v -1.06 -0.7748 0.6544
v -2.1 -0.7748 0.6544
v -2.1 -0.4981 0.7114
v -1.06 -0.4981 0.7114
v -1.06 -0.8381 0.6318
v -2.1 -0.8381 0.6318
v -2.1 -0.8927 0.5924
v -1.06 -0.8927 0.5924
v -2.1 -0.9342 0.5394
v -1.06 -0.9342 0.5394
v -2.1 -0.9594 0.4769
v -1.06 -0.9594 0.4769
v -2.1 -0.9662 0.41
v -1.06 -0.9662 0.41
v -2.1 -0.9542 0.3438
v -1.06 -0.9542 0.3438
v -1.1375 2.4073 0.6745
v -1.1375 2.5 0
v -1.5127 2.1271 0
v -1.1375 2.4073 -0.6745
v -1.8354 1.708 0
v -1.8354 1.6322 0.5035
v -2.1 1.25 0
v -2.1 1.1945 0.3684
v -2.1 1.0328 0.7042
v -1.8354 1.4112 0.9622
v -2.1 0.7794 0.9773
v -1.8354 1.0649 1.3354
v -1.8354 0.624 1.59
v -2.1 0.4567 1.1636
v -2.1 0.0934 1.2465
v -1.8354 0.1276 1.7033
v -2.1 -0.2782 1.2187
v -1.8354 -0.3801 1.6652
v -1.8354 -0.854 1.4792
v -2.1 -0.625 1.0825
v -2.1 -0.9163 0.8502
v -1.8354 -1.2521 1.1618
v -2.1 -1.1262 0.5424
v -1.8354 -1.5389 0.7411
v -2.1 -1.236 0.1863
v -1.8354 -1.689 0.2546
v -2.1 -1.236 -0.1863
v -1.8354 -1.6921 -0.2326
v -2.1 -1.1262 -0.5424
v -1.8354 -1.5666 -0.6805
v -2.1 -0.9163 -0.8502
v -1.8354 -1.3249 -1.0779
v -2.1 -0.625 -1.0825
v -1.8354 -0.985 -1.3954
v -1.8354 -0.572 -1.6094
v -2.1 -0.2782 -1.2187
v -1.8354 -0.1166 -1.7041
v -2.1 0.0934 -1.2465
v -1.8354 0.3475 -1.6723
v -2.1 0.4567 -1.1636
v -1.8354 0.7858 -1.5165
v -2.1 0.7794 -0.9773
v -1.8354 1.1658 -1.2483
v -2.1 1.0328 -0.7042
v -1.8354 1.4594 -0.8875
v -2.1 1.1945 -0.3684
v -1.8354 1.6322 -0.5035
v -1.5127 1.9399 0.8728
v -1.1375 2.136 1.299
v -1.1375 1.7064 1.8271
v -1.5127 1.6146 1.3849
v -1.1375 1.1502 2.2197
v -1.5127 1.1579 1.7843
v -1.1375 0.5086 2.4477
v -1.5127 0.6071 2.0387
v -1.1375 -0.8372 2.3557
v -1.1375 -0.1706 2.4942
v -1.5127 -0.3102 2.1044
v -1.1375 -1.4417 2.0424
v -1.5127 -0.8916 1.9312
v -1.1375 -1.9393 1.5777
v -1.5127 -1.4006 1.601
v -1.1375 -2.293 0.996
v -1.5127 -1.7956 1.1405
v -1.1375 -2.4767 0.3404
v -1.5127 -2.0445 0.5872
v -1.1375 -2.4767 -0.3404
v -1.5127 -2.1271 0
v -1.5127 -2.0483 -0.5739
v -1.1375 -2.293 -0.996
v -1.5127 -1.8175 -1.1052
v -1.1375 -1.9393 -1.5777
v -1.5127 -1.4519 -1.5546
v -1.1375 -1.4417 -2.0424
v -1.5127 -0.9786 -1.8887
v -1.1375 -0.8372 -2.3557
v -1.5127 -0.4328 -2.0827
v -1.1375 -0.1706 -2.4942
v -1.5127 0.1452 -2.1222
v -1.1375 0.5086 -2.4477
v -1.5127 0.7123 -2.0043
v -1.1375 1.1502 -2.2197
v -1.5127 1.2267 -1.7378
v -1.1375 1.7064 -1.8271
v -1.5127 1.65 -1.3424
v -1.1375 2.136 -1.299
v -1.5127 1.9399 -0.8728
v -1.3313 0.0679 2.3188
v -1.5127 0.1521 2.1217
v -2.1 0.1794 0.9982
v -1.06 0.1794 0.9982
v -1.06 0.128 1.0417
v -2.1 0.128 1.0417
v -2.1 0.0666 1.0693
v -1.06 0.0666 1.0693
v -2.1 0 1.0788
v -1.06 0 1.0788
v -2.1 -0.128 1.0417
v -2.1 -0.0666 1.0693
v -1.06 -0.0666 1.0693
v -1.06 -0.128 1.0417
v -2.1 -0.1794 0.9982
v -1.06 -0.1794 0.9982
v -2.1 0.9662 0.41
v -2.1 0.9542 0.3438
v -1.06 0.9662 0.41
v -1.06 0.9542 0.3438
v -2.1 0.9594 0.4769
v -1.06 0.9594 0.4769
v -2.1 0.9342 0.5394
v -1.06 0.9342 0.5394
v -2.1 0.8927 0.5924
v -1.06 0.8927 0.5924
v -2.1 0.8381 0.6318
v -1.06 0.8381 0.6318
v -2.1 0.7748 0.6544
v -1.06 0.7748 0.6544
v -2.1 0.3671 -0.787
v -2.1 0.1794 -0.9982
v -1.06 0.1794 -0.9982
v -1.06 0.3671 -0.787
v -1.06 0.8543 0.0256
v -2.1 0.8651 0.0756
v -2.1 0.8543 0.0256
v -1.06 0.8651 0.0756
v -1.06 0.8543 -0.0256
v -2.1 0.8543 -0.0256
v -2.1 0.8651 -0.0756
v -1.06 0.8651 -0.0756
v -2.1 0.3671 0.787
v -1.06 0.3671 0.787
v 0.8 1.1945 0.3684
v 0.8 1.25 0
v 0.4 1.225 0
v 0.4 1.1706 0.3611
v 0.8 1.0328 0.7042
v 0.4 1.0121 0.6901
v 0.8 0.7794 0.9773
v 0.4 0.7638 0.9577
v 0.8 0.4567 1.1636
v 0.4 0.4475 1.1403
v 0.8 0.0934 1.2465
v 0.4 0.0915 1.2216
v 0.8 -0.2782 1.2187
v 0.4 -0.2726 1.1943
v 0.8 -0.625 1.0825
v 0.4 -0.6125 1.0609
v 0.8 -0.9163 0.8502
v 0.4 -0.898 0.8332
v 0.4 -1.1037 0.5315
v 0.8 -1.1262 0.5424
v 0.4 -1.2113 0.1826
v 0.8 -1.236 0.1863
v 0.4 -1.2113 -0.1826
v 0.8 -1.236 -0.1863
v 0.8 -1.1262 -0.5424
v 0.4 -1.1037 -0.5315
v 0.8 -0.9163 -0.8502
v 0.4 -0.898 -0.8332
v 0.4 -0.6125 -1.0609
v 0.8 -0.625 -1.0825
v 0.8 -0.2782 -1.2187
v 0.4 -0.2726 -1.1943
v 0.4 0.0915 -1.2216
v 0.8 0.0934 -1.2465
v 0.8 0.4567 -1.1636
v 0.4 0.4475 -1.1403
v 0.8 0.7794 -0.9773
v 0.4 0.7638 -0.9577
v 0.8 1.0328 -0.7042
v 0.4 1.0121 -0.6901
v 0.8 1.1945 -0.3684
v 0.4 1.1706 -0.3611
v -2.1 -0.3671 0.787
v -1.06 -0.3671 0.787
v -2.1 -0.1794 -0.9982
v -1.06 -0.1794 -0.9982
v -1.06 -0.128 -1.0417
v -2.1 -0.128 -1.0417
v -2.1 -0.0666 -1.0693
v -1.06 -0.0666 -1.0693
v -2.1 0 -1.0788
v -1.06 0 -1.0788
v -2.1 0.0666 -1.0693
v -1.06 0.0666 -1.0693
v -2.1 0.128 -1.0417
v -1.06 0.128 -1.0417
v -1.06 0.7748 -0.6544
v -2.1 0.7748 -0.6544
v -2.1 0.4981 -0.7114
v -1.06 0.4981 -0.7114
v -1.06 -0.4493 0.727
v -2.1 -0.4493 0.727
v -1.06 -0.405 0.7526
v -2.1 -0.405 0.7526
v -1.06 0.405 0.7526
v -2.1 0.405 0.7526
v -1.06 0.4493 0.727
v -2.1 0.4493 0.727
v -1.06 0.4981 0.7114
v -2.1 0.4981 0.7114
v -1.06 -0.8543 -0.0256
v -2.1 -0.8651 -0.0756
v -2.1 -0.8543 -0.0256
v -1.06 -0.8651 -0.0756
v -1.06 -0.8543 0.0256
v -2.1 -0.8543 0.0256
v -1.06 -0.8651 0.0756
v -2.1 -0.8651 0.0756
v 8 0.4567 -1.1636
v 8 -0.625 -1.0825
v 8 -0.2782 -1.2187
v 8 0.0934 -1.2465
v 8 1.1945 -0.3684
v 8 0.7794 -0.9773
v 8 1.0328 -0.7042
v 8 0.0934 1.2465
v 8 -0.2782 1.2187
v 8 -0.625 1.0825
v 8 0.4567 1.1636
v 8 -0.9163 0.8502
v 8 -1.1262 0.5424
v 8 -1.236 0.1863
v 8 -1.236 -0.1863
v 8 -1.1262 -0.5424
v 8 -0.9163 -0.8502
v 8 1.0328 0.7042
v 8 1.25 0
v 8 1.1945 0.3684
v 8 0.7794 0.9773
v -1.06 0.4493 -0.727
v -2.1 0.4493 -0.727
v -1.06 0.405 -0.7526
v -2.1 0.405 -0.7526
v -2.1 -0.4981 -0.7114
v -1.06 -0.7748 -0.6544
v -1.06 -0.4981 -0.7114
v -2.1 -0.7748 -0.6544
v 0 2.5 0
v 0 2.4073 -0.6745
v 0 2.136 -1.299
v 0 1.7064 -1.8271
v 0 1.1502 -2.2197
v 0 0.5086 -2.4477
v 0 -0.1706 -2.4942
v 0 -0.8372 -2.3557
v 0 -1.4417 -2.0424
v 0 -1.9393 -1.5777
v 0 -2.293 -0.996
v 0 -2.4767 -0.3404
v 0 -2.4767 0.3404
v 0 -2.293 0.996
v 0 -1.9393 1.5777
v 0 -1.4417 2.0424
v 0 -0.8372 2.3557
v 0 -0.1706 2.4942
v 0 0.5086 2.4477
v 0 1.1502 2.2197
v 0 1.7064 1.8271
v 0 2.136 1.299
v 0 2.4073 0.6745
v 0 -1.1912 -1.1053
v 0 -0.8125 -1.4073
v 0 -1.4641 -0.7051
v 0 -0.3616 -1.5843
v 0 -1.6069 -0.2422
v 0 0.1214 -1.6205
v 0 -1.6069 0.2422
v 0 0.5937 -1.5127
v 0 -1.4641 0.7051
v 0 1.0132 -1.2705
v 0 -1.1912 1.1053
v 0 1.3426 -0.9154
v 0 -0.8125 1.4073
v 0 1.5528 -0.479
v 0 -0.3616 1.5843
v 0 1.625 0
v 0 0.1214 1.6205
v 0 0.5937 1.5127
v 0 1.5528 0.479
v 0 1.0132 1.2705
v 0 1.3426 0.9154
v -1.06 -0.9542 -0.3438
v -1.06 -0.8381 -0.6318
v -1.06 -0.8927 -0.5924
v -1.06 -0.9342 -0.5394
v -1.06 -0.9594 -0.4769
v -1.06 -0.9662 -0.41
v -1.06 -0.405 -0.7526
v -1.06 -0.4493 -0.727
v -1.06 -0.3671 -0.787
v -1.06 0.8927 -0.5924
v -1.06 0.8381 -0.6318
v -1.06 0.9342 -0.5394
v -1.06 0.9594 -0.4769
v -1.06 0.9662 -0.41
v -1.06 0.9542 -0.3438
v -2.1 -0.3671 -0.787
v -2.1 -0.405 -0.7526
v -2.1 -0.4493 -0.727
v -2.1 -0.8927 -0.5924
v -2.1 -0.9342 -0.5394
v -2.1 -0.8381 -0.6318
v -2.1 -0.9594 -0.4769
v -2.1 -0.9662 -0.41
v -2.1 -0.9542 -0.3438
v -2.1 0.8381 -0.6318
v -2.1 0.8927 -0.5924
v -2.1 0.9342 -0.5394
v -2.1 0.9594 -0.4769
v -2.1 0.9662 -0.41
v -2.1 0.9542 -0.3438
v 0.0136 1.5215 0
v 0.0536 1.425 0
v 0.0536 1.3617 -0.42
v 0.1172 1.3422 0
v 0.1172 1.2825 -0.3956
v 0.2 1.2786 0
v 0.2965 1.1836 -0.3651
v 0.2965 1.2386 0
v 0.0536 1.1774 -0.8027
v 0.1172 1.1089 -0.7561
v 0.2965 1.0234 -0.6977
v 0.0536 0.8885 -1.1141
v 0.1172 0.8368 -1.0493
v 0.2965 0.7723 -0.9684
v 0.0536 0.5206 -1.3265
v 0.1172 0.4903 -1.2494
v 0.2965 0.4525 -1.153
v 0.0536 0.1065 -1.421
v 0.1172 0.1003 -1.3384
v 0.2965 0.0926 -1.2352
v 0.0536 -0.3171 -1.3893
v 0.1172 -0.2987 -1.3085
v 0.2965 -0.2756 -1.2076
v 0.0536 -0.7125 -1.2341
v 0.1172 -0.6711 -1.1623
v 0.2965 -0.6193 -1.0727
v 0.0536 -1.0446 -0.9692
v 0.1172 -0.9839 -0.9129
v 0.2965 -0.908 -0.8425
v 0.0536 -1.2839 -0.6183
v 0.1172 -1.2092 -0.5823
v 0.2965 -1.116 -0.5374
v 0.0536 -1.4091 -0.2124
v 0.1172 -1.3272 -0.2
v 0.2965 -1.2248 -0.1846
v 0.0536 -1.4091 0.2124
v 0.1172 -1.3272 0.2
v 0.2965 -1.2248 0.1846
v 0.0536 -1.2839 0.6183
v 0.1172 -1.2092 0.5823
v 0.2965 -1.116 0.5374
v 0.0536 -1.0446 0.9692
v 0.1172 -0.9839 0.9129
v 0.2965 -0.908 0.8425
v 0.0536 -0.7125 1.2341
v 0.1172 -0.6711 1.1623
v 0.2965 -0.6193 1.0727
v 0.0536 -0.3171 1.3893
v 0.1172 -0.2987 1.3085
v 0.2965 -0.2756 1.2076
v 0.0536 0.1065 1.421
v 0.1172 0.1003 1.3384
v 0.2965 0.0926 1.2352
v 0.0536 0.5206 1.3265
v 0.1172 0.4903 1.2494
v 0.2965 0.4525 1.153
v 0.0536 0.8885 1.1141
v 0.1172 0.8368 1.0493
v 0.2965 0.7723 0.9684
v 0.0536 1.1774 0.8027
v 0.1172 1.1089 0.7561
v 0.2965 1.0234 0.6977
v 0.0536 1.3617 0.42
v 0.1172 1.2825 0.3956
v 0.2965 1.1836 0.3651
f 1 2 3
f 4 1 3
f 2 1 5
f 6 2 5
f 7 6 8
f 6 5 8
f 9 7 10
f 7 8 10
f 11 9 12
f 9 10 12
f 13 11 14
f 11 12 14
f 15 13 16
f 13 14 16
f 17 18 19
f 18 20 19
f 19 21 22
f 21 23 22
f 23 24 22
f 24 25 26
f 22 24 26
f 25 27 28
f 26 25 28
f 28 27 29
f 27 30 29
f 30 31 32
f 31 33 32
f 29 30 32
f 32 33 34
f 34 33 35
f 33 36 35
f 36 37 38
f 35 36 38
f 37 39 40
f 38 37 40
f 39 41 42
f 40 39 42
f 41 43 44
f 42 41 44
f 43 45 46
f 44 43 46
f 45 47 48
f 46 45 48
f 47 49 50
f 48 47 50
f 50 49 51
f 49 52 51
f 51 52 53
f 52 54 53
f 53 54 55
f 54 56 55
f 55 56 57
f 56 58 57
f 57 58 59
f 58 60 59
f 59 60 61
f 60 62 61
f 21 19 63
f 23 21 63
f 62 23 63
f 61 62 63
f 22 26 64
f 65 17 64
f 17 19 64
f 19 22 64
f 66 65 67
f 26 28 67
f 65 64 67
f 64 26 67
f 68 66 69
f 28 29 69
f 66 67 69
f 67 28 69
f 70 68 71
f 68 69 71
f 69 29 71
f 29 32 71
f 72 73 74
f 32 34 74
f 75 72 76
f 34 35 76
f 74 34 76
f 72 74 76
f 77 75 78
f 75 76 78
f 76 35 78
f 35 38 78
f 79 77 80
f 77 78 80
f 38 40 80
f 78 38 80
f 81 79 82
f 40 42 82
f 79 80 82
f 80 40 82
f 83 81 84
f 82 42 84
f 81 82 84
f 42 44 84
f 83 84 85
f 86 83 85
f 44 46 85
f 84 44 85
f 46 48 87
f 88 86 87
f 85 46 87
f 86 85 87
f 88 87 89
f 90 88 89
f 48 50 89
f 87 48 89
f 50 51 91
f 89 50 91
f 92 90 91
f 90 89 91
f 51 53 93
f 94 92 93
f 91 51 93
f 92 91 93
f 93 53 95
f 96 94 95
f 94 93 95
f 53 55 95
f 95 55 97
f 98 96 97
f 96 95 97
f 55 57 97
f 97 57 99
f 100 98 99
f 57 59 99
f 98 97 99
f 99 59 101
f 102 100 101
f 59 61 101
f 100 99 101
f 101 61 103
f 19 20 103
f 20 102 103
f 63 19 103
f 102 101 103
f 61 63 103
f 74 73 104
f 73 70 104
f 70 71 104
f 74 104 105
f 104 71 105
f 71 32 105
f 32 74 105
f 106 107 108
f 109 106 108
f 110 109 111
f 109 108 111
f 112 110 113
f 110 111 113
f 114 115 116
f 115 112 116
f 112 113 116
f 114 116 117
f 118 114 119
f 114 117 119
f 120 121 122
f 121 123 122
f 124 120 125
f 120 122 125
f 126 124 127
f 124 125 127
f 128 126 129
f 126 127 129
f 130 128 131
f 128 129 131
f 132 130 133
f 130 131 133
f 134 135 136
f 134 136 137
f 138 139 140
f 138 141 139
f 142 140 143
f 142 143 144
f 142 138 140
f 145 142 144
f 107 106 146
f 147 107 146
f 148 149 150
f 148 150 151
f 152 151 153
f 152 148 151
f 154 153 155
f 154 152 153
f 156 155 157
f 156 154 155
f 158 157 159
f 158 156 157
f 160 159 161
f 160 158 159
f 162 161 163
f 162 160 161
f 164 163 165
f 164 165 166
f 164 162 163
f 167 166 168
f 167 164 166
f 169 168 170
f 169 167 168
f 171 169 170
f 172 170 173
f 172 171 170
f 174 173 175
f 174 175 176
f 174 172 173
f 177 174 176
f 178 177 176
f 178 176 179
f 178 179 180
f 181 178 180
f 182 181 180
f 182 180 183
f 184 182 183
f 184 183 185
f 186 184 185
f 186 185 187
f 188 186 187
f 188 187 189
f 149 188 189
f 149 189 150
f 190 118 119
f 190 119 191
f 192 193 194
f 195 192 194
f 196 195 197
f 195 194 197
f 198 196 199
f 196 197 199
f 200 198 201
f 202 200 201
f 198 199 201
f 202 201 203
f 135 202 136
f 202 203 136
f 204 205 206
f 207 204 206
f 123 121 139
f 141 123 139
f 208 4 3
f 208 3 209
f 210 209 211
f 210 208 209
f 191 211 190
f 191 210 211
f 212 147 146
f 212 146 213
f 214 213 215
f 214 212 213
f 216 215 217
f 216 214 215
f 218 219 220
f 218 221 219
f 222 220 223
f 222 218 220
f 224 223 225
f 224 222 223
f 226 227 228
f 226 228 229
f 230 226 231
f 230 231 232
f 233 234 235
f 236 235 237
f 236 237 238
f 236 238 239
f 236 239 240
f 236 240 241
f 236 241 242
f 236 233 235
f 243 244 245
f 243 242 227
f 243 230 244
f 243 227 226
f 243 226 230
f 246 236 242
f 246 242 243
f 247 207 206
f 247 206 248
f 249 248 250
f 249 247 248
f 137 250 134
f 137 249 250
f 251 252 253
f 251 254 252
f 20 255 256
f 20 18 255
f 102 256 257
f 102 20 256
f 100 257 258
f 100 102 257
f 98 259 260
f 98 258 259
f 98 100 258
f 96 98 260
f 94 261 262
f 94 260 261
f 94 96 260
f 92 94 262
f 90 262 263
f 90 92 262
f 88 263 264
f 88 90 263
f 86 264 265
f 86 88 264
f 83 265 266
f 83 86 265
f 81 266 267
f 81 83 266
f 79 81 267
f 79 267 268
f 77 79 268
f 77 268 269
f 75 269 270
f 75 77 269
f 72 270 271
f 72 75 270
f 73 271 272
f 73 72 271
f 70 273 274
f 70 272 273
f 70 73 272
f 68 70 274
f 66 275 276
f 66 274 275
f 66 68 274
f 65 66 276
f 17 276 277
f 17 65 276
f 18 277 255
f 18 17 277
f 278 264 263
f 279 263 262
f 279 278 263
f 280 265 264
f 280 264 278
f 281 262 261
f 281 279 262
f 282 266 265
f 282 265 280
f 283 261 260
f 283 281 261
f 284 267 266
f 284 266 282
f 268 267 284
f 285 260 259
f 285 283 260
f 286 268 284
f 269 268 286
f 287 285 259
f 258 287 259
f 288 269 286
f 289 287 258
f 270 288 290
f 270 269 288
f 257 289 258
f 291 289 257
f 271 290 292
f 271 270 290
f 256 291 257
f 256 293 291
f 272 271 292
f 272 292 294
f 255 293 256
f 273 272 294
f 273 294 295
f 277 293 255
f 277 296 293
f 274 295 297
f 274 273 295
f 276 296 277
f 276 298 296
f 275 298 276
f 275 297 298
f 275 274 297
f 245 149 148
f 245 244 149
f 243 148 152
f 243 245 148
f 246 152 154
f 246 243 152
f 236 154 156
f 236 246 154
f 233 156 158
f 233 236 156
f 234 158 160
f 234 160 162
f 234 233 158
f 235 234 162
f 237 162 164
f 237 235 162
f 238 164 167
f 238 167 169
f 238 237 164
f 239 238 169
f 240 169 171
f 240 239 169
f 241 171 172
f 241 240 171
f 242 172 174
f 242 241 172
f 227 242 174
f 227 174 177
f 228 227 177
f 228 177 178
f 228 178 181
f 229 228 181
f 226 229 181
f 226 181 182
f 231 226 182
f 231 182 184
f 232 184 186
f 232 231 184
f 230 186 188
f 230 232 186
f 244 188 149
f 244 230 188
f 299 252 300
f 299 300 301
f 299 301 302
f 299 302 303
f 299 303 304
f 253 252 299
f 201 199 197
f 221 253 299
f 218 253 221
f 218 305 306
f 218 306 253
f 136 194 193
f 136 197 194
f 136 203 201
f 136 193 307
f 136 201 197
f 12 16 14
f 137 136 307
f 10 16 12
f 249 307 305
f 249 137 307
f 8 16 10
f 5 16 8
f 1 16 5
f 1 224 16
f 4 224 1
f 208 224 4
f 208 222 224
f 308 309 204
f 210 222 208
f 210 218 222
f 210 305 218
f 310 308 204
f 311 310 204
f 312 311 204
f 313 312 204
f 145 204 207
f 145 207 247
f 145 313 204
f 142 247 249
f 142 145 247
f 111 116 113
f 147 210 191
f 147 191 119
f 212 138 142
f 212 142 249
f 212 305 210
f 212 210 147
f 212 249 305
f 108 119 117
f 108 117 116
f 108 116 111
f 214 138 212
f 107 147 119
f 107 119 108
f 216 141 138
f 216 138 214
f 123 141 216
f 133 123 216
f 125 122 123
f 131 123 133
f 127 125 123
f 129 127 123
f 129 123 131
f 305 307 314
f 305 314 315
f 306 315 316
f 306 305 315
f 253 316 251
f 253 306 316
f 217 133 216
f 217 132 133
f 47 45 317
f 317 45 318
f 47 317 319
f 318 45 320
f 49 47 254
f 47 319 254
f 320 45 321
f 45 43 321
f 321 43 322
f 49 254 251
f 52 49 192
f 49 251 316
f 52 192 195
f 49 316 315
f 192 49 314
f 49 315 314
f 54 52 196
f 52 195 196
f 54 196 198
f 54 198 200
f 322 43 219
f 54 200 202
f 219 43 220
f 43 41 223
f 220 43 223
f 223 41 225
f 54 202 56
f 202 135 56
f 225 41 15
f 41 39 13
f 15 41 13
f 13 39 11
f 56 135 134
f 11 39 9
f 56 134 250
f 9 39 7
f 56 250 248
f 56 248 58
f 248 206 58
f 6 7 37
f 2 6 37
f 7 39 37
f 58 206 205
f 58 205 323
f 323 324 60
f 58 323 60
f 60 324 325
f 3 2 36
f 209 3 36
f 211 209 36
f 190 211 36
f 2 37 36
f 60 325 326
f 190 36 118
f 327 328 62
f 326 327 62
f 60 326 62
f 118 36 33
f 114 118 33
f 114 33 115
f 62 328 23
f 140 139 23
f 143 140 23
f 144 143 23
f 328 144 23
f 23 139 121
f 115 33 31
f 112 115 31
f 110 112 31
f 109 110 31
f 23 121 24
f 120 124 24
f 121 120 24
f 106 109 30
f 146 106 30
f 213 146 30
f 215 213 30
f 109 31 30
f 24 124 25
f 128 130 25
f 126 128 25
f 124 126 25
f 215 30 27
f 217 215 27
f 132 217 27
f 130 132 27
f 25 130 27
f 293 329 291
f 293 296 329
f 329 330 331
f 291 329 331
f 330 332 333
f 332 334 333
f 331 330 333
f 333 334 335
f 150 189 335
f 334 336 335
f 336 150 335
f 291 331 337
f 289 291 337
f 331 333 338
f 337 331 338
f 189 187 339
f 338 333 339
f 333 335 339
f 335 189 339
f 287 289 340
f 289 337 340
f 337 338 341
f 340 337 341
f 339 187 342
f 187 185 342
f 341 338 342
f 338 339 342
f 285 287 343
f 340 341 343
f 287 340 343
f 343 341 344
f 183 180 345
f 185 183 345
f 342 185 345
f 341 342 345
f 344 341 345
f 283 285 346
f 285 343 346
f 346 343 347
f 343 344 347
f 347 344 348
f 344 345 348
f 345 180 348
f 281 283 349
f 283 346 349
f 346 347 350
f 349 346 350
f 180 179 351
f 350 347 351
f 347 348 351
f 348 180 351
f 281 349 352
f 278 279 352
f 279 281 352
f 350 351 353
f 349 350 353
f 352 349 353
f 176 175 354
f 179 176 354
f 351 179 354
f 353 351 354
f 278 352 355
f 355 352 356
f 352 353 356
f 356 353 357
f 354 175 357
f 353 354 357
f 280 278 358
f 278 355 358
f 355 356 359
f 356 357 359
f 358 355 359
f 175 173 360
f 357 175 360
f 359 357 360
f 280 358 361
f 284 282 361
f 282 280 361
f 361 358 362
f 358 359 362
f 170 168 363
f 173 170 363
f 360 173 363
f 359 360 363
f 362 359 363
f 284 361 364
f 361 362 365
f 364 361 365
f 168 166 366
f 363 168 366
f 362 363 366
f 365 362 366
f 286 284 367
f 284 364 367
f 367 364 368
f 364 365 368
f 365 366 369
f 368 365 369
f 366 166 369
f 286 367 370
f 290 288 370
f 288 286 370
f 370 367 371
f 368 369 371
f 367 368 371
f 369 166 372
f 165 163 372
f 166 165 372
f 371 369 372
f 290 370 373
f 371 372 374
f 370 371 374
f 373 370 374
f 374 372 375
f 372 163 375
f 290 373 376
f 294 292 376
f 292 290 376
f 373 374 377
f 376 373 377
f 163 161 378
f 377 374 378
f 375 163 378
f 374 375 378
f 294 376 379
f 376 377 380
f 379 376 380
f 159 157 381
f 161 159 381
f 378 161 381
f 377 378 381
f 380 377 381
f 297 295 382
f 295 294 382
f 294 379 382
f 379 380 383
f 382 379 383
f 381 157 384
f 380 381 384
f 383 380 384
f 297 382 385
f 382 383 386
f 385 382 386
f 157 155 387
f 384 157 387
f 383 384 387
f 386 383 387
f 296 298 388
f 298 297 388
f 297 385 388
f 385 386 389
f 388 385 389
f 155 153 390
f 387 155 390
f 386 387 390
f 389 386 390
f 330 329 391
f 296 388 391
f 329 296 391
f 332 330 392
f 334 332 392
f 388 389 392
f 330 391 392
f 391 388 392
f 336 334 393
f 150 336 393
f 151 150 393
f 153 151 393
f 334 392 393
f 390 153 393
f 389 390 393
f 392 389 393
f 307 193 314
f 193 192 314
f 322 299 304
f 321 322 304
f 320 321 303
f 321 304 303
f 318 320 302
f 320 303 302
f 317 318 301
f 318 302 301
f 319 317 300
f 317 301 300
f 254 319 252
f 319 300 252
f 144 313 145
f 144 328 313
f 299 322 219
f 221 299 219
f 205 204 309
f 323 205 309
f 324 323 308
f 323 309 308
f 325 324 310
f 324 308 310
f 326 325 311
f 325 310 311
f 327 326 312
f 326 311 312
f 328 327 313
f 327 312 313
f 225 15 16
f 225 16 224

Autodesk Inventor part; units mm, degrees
ref_plane "YZ Plane" through (0, 0, 0) normal (1, 0, 0) x (0, 1, 0)
ref_plane "XZ Plane" through (0, 0, 0) normal (0, 1, 0) x (-1, 0, 0)
ref_plane "XY Plane" through (0, 0, 0) normal (0, 0, 1) x (1, 0, 0)
sketch "Sketch4" plane through (0, 0, 0) normal (0, 0, 1) x (1, 0, 0)
  line L0 (-2.1, 0) -> (8, 0)
  line L1 (0, 0) -> (-2.1, 0)
  line L2 (0, 2.5) -> (0, 1.625)
  line L3 (0.4, 1.225) -> (0.4, 1.225)
  line L4 (0.4, 1.225) -> (0.8, 1.25)
  arc A0 (0, 1.625) -> (0.4, 1.225) centre (0.4, 1.625) ccw
  line L5 (-2.1, 0) -> (-2.1, 1.25)
  line L6 (0, 2.5) -> (-1.1375, 2.5)
  arc A1 (-1.1375, 2.5) -> (-2.1, 1.25) centre (1.4883, -0.5175) ccw
  line L7 (0.8, 1.25) -> (8, 1.25)
  line L8 (8, 1.25) -> (8, 0)
  point P0 (0, 1.225)
  dimension "d71" = 0.4
  dimension "d72" = 8
  dimension "d74" = 0.4
  dimension "d75" = 2.45
  dimension "d78" = 2.5
  dimension "d82" = 4
  dimension "d83" = 2.1
  dimension "d84" = 5
  dimension "d104" = 7.2
  dimension "d105" = 2.5
revolve "Revolution7" add sketch "Sketch4" angle 360 about axis through (-2.1, 0, 0) along (1, 0, 0)
sketch "Sketch5" plane through (-2.1, 0, 0) normal (-1, 0, 0) x (0, 0, 1)
  circle A0 centre (0, 0) radius 1.2 construction
  circle A1 centre (0, 0) radius 0.84 construction
  line L0 (0, 0) -> (-0.7275, 0.42)
  line L1 (0, 0) -> (-0.7275, -0.42)
  line L2 (-1.8008, 0) -> (1.7887, 0)
  line L3 (-1.2, 0) -> (-0.7275, -0.42)
  line L4 (-1.2, 0) -> (-0.7275, 0.42)
  dimension "d88" = 2.4
  dimension "d89" = 1.68
  dimension "d90" = 30
  dimension "d91" = 30
extrude "Extrusion1" cut sketch "Sketch5" against normal blind 1.04
pattern_circular "Circular Pattern1" count 6 over 360 about axis through (-10, 0, 0) along (1, 0, 0) of "Extrusion1"
fillet "Fillet1" radius 0.24 12 edges at (-1.58, -1.0392, -0.6) (-1.58, -0.42, -0.7275) (-1.58, -0.84, 0) (-1.58, -1.0392, 0.6) (-1.58, -0.42, 0.7275) (-1.58, 0, 1.2) (-1.58, 0.84, 0) (-1.58, 1.0392, 0.6) (-1.58, 0.42, 0.7275) (-1.58, 0.42, -0.7275) (-1.58, 0, -1.2) (-1.58, 1.0392, -0.6)
thread "Thread7" size "M2.5x0.45" class "6g" standard "ISO Metric profile" length 7.2
properties part number "Flachkopfschraube mit Innenrund ISO 14583 - M2,5 x 8 - A3-70" material "Edelstahl"
